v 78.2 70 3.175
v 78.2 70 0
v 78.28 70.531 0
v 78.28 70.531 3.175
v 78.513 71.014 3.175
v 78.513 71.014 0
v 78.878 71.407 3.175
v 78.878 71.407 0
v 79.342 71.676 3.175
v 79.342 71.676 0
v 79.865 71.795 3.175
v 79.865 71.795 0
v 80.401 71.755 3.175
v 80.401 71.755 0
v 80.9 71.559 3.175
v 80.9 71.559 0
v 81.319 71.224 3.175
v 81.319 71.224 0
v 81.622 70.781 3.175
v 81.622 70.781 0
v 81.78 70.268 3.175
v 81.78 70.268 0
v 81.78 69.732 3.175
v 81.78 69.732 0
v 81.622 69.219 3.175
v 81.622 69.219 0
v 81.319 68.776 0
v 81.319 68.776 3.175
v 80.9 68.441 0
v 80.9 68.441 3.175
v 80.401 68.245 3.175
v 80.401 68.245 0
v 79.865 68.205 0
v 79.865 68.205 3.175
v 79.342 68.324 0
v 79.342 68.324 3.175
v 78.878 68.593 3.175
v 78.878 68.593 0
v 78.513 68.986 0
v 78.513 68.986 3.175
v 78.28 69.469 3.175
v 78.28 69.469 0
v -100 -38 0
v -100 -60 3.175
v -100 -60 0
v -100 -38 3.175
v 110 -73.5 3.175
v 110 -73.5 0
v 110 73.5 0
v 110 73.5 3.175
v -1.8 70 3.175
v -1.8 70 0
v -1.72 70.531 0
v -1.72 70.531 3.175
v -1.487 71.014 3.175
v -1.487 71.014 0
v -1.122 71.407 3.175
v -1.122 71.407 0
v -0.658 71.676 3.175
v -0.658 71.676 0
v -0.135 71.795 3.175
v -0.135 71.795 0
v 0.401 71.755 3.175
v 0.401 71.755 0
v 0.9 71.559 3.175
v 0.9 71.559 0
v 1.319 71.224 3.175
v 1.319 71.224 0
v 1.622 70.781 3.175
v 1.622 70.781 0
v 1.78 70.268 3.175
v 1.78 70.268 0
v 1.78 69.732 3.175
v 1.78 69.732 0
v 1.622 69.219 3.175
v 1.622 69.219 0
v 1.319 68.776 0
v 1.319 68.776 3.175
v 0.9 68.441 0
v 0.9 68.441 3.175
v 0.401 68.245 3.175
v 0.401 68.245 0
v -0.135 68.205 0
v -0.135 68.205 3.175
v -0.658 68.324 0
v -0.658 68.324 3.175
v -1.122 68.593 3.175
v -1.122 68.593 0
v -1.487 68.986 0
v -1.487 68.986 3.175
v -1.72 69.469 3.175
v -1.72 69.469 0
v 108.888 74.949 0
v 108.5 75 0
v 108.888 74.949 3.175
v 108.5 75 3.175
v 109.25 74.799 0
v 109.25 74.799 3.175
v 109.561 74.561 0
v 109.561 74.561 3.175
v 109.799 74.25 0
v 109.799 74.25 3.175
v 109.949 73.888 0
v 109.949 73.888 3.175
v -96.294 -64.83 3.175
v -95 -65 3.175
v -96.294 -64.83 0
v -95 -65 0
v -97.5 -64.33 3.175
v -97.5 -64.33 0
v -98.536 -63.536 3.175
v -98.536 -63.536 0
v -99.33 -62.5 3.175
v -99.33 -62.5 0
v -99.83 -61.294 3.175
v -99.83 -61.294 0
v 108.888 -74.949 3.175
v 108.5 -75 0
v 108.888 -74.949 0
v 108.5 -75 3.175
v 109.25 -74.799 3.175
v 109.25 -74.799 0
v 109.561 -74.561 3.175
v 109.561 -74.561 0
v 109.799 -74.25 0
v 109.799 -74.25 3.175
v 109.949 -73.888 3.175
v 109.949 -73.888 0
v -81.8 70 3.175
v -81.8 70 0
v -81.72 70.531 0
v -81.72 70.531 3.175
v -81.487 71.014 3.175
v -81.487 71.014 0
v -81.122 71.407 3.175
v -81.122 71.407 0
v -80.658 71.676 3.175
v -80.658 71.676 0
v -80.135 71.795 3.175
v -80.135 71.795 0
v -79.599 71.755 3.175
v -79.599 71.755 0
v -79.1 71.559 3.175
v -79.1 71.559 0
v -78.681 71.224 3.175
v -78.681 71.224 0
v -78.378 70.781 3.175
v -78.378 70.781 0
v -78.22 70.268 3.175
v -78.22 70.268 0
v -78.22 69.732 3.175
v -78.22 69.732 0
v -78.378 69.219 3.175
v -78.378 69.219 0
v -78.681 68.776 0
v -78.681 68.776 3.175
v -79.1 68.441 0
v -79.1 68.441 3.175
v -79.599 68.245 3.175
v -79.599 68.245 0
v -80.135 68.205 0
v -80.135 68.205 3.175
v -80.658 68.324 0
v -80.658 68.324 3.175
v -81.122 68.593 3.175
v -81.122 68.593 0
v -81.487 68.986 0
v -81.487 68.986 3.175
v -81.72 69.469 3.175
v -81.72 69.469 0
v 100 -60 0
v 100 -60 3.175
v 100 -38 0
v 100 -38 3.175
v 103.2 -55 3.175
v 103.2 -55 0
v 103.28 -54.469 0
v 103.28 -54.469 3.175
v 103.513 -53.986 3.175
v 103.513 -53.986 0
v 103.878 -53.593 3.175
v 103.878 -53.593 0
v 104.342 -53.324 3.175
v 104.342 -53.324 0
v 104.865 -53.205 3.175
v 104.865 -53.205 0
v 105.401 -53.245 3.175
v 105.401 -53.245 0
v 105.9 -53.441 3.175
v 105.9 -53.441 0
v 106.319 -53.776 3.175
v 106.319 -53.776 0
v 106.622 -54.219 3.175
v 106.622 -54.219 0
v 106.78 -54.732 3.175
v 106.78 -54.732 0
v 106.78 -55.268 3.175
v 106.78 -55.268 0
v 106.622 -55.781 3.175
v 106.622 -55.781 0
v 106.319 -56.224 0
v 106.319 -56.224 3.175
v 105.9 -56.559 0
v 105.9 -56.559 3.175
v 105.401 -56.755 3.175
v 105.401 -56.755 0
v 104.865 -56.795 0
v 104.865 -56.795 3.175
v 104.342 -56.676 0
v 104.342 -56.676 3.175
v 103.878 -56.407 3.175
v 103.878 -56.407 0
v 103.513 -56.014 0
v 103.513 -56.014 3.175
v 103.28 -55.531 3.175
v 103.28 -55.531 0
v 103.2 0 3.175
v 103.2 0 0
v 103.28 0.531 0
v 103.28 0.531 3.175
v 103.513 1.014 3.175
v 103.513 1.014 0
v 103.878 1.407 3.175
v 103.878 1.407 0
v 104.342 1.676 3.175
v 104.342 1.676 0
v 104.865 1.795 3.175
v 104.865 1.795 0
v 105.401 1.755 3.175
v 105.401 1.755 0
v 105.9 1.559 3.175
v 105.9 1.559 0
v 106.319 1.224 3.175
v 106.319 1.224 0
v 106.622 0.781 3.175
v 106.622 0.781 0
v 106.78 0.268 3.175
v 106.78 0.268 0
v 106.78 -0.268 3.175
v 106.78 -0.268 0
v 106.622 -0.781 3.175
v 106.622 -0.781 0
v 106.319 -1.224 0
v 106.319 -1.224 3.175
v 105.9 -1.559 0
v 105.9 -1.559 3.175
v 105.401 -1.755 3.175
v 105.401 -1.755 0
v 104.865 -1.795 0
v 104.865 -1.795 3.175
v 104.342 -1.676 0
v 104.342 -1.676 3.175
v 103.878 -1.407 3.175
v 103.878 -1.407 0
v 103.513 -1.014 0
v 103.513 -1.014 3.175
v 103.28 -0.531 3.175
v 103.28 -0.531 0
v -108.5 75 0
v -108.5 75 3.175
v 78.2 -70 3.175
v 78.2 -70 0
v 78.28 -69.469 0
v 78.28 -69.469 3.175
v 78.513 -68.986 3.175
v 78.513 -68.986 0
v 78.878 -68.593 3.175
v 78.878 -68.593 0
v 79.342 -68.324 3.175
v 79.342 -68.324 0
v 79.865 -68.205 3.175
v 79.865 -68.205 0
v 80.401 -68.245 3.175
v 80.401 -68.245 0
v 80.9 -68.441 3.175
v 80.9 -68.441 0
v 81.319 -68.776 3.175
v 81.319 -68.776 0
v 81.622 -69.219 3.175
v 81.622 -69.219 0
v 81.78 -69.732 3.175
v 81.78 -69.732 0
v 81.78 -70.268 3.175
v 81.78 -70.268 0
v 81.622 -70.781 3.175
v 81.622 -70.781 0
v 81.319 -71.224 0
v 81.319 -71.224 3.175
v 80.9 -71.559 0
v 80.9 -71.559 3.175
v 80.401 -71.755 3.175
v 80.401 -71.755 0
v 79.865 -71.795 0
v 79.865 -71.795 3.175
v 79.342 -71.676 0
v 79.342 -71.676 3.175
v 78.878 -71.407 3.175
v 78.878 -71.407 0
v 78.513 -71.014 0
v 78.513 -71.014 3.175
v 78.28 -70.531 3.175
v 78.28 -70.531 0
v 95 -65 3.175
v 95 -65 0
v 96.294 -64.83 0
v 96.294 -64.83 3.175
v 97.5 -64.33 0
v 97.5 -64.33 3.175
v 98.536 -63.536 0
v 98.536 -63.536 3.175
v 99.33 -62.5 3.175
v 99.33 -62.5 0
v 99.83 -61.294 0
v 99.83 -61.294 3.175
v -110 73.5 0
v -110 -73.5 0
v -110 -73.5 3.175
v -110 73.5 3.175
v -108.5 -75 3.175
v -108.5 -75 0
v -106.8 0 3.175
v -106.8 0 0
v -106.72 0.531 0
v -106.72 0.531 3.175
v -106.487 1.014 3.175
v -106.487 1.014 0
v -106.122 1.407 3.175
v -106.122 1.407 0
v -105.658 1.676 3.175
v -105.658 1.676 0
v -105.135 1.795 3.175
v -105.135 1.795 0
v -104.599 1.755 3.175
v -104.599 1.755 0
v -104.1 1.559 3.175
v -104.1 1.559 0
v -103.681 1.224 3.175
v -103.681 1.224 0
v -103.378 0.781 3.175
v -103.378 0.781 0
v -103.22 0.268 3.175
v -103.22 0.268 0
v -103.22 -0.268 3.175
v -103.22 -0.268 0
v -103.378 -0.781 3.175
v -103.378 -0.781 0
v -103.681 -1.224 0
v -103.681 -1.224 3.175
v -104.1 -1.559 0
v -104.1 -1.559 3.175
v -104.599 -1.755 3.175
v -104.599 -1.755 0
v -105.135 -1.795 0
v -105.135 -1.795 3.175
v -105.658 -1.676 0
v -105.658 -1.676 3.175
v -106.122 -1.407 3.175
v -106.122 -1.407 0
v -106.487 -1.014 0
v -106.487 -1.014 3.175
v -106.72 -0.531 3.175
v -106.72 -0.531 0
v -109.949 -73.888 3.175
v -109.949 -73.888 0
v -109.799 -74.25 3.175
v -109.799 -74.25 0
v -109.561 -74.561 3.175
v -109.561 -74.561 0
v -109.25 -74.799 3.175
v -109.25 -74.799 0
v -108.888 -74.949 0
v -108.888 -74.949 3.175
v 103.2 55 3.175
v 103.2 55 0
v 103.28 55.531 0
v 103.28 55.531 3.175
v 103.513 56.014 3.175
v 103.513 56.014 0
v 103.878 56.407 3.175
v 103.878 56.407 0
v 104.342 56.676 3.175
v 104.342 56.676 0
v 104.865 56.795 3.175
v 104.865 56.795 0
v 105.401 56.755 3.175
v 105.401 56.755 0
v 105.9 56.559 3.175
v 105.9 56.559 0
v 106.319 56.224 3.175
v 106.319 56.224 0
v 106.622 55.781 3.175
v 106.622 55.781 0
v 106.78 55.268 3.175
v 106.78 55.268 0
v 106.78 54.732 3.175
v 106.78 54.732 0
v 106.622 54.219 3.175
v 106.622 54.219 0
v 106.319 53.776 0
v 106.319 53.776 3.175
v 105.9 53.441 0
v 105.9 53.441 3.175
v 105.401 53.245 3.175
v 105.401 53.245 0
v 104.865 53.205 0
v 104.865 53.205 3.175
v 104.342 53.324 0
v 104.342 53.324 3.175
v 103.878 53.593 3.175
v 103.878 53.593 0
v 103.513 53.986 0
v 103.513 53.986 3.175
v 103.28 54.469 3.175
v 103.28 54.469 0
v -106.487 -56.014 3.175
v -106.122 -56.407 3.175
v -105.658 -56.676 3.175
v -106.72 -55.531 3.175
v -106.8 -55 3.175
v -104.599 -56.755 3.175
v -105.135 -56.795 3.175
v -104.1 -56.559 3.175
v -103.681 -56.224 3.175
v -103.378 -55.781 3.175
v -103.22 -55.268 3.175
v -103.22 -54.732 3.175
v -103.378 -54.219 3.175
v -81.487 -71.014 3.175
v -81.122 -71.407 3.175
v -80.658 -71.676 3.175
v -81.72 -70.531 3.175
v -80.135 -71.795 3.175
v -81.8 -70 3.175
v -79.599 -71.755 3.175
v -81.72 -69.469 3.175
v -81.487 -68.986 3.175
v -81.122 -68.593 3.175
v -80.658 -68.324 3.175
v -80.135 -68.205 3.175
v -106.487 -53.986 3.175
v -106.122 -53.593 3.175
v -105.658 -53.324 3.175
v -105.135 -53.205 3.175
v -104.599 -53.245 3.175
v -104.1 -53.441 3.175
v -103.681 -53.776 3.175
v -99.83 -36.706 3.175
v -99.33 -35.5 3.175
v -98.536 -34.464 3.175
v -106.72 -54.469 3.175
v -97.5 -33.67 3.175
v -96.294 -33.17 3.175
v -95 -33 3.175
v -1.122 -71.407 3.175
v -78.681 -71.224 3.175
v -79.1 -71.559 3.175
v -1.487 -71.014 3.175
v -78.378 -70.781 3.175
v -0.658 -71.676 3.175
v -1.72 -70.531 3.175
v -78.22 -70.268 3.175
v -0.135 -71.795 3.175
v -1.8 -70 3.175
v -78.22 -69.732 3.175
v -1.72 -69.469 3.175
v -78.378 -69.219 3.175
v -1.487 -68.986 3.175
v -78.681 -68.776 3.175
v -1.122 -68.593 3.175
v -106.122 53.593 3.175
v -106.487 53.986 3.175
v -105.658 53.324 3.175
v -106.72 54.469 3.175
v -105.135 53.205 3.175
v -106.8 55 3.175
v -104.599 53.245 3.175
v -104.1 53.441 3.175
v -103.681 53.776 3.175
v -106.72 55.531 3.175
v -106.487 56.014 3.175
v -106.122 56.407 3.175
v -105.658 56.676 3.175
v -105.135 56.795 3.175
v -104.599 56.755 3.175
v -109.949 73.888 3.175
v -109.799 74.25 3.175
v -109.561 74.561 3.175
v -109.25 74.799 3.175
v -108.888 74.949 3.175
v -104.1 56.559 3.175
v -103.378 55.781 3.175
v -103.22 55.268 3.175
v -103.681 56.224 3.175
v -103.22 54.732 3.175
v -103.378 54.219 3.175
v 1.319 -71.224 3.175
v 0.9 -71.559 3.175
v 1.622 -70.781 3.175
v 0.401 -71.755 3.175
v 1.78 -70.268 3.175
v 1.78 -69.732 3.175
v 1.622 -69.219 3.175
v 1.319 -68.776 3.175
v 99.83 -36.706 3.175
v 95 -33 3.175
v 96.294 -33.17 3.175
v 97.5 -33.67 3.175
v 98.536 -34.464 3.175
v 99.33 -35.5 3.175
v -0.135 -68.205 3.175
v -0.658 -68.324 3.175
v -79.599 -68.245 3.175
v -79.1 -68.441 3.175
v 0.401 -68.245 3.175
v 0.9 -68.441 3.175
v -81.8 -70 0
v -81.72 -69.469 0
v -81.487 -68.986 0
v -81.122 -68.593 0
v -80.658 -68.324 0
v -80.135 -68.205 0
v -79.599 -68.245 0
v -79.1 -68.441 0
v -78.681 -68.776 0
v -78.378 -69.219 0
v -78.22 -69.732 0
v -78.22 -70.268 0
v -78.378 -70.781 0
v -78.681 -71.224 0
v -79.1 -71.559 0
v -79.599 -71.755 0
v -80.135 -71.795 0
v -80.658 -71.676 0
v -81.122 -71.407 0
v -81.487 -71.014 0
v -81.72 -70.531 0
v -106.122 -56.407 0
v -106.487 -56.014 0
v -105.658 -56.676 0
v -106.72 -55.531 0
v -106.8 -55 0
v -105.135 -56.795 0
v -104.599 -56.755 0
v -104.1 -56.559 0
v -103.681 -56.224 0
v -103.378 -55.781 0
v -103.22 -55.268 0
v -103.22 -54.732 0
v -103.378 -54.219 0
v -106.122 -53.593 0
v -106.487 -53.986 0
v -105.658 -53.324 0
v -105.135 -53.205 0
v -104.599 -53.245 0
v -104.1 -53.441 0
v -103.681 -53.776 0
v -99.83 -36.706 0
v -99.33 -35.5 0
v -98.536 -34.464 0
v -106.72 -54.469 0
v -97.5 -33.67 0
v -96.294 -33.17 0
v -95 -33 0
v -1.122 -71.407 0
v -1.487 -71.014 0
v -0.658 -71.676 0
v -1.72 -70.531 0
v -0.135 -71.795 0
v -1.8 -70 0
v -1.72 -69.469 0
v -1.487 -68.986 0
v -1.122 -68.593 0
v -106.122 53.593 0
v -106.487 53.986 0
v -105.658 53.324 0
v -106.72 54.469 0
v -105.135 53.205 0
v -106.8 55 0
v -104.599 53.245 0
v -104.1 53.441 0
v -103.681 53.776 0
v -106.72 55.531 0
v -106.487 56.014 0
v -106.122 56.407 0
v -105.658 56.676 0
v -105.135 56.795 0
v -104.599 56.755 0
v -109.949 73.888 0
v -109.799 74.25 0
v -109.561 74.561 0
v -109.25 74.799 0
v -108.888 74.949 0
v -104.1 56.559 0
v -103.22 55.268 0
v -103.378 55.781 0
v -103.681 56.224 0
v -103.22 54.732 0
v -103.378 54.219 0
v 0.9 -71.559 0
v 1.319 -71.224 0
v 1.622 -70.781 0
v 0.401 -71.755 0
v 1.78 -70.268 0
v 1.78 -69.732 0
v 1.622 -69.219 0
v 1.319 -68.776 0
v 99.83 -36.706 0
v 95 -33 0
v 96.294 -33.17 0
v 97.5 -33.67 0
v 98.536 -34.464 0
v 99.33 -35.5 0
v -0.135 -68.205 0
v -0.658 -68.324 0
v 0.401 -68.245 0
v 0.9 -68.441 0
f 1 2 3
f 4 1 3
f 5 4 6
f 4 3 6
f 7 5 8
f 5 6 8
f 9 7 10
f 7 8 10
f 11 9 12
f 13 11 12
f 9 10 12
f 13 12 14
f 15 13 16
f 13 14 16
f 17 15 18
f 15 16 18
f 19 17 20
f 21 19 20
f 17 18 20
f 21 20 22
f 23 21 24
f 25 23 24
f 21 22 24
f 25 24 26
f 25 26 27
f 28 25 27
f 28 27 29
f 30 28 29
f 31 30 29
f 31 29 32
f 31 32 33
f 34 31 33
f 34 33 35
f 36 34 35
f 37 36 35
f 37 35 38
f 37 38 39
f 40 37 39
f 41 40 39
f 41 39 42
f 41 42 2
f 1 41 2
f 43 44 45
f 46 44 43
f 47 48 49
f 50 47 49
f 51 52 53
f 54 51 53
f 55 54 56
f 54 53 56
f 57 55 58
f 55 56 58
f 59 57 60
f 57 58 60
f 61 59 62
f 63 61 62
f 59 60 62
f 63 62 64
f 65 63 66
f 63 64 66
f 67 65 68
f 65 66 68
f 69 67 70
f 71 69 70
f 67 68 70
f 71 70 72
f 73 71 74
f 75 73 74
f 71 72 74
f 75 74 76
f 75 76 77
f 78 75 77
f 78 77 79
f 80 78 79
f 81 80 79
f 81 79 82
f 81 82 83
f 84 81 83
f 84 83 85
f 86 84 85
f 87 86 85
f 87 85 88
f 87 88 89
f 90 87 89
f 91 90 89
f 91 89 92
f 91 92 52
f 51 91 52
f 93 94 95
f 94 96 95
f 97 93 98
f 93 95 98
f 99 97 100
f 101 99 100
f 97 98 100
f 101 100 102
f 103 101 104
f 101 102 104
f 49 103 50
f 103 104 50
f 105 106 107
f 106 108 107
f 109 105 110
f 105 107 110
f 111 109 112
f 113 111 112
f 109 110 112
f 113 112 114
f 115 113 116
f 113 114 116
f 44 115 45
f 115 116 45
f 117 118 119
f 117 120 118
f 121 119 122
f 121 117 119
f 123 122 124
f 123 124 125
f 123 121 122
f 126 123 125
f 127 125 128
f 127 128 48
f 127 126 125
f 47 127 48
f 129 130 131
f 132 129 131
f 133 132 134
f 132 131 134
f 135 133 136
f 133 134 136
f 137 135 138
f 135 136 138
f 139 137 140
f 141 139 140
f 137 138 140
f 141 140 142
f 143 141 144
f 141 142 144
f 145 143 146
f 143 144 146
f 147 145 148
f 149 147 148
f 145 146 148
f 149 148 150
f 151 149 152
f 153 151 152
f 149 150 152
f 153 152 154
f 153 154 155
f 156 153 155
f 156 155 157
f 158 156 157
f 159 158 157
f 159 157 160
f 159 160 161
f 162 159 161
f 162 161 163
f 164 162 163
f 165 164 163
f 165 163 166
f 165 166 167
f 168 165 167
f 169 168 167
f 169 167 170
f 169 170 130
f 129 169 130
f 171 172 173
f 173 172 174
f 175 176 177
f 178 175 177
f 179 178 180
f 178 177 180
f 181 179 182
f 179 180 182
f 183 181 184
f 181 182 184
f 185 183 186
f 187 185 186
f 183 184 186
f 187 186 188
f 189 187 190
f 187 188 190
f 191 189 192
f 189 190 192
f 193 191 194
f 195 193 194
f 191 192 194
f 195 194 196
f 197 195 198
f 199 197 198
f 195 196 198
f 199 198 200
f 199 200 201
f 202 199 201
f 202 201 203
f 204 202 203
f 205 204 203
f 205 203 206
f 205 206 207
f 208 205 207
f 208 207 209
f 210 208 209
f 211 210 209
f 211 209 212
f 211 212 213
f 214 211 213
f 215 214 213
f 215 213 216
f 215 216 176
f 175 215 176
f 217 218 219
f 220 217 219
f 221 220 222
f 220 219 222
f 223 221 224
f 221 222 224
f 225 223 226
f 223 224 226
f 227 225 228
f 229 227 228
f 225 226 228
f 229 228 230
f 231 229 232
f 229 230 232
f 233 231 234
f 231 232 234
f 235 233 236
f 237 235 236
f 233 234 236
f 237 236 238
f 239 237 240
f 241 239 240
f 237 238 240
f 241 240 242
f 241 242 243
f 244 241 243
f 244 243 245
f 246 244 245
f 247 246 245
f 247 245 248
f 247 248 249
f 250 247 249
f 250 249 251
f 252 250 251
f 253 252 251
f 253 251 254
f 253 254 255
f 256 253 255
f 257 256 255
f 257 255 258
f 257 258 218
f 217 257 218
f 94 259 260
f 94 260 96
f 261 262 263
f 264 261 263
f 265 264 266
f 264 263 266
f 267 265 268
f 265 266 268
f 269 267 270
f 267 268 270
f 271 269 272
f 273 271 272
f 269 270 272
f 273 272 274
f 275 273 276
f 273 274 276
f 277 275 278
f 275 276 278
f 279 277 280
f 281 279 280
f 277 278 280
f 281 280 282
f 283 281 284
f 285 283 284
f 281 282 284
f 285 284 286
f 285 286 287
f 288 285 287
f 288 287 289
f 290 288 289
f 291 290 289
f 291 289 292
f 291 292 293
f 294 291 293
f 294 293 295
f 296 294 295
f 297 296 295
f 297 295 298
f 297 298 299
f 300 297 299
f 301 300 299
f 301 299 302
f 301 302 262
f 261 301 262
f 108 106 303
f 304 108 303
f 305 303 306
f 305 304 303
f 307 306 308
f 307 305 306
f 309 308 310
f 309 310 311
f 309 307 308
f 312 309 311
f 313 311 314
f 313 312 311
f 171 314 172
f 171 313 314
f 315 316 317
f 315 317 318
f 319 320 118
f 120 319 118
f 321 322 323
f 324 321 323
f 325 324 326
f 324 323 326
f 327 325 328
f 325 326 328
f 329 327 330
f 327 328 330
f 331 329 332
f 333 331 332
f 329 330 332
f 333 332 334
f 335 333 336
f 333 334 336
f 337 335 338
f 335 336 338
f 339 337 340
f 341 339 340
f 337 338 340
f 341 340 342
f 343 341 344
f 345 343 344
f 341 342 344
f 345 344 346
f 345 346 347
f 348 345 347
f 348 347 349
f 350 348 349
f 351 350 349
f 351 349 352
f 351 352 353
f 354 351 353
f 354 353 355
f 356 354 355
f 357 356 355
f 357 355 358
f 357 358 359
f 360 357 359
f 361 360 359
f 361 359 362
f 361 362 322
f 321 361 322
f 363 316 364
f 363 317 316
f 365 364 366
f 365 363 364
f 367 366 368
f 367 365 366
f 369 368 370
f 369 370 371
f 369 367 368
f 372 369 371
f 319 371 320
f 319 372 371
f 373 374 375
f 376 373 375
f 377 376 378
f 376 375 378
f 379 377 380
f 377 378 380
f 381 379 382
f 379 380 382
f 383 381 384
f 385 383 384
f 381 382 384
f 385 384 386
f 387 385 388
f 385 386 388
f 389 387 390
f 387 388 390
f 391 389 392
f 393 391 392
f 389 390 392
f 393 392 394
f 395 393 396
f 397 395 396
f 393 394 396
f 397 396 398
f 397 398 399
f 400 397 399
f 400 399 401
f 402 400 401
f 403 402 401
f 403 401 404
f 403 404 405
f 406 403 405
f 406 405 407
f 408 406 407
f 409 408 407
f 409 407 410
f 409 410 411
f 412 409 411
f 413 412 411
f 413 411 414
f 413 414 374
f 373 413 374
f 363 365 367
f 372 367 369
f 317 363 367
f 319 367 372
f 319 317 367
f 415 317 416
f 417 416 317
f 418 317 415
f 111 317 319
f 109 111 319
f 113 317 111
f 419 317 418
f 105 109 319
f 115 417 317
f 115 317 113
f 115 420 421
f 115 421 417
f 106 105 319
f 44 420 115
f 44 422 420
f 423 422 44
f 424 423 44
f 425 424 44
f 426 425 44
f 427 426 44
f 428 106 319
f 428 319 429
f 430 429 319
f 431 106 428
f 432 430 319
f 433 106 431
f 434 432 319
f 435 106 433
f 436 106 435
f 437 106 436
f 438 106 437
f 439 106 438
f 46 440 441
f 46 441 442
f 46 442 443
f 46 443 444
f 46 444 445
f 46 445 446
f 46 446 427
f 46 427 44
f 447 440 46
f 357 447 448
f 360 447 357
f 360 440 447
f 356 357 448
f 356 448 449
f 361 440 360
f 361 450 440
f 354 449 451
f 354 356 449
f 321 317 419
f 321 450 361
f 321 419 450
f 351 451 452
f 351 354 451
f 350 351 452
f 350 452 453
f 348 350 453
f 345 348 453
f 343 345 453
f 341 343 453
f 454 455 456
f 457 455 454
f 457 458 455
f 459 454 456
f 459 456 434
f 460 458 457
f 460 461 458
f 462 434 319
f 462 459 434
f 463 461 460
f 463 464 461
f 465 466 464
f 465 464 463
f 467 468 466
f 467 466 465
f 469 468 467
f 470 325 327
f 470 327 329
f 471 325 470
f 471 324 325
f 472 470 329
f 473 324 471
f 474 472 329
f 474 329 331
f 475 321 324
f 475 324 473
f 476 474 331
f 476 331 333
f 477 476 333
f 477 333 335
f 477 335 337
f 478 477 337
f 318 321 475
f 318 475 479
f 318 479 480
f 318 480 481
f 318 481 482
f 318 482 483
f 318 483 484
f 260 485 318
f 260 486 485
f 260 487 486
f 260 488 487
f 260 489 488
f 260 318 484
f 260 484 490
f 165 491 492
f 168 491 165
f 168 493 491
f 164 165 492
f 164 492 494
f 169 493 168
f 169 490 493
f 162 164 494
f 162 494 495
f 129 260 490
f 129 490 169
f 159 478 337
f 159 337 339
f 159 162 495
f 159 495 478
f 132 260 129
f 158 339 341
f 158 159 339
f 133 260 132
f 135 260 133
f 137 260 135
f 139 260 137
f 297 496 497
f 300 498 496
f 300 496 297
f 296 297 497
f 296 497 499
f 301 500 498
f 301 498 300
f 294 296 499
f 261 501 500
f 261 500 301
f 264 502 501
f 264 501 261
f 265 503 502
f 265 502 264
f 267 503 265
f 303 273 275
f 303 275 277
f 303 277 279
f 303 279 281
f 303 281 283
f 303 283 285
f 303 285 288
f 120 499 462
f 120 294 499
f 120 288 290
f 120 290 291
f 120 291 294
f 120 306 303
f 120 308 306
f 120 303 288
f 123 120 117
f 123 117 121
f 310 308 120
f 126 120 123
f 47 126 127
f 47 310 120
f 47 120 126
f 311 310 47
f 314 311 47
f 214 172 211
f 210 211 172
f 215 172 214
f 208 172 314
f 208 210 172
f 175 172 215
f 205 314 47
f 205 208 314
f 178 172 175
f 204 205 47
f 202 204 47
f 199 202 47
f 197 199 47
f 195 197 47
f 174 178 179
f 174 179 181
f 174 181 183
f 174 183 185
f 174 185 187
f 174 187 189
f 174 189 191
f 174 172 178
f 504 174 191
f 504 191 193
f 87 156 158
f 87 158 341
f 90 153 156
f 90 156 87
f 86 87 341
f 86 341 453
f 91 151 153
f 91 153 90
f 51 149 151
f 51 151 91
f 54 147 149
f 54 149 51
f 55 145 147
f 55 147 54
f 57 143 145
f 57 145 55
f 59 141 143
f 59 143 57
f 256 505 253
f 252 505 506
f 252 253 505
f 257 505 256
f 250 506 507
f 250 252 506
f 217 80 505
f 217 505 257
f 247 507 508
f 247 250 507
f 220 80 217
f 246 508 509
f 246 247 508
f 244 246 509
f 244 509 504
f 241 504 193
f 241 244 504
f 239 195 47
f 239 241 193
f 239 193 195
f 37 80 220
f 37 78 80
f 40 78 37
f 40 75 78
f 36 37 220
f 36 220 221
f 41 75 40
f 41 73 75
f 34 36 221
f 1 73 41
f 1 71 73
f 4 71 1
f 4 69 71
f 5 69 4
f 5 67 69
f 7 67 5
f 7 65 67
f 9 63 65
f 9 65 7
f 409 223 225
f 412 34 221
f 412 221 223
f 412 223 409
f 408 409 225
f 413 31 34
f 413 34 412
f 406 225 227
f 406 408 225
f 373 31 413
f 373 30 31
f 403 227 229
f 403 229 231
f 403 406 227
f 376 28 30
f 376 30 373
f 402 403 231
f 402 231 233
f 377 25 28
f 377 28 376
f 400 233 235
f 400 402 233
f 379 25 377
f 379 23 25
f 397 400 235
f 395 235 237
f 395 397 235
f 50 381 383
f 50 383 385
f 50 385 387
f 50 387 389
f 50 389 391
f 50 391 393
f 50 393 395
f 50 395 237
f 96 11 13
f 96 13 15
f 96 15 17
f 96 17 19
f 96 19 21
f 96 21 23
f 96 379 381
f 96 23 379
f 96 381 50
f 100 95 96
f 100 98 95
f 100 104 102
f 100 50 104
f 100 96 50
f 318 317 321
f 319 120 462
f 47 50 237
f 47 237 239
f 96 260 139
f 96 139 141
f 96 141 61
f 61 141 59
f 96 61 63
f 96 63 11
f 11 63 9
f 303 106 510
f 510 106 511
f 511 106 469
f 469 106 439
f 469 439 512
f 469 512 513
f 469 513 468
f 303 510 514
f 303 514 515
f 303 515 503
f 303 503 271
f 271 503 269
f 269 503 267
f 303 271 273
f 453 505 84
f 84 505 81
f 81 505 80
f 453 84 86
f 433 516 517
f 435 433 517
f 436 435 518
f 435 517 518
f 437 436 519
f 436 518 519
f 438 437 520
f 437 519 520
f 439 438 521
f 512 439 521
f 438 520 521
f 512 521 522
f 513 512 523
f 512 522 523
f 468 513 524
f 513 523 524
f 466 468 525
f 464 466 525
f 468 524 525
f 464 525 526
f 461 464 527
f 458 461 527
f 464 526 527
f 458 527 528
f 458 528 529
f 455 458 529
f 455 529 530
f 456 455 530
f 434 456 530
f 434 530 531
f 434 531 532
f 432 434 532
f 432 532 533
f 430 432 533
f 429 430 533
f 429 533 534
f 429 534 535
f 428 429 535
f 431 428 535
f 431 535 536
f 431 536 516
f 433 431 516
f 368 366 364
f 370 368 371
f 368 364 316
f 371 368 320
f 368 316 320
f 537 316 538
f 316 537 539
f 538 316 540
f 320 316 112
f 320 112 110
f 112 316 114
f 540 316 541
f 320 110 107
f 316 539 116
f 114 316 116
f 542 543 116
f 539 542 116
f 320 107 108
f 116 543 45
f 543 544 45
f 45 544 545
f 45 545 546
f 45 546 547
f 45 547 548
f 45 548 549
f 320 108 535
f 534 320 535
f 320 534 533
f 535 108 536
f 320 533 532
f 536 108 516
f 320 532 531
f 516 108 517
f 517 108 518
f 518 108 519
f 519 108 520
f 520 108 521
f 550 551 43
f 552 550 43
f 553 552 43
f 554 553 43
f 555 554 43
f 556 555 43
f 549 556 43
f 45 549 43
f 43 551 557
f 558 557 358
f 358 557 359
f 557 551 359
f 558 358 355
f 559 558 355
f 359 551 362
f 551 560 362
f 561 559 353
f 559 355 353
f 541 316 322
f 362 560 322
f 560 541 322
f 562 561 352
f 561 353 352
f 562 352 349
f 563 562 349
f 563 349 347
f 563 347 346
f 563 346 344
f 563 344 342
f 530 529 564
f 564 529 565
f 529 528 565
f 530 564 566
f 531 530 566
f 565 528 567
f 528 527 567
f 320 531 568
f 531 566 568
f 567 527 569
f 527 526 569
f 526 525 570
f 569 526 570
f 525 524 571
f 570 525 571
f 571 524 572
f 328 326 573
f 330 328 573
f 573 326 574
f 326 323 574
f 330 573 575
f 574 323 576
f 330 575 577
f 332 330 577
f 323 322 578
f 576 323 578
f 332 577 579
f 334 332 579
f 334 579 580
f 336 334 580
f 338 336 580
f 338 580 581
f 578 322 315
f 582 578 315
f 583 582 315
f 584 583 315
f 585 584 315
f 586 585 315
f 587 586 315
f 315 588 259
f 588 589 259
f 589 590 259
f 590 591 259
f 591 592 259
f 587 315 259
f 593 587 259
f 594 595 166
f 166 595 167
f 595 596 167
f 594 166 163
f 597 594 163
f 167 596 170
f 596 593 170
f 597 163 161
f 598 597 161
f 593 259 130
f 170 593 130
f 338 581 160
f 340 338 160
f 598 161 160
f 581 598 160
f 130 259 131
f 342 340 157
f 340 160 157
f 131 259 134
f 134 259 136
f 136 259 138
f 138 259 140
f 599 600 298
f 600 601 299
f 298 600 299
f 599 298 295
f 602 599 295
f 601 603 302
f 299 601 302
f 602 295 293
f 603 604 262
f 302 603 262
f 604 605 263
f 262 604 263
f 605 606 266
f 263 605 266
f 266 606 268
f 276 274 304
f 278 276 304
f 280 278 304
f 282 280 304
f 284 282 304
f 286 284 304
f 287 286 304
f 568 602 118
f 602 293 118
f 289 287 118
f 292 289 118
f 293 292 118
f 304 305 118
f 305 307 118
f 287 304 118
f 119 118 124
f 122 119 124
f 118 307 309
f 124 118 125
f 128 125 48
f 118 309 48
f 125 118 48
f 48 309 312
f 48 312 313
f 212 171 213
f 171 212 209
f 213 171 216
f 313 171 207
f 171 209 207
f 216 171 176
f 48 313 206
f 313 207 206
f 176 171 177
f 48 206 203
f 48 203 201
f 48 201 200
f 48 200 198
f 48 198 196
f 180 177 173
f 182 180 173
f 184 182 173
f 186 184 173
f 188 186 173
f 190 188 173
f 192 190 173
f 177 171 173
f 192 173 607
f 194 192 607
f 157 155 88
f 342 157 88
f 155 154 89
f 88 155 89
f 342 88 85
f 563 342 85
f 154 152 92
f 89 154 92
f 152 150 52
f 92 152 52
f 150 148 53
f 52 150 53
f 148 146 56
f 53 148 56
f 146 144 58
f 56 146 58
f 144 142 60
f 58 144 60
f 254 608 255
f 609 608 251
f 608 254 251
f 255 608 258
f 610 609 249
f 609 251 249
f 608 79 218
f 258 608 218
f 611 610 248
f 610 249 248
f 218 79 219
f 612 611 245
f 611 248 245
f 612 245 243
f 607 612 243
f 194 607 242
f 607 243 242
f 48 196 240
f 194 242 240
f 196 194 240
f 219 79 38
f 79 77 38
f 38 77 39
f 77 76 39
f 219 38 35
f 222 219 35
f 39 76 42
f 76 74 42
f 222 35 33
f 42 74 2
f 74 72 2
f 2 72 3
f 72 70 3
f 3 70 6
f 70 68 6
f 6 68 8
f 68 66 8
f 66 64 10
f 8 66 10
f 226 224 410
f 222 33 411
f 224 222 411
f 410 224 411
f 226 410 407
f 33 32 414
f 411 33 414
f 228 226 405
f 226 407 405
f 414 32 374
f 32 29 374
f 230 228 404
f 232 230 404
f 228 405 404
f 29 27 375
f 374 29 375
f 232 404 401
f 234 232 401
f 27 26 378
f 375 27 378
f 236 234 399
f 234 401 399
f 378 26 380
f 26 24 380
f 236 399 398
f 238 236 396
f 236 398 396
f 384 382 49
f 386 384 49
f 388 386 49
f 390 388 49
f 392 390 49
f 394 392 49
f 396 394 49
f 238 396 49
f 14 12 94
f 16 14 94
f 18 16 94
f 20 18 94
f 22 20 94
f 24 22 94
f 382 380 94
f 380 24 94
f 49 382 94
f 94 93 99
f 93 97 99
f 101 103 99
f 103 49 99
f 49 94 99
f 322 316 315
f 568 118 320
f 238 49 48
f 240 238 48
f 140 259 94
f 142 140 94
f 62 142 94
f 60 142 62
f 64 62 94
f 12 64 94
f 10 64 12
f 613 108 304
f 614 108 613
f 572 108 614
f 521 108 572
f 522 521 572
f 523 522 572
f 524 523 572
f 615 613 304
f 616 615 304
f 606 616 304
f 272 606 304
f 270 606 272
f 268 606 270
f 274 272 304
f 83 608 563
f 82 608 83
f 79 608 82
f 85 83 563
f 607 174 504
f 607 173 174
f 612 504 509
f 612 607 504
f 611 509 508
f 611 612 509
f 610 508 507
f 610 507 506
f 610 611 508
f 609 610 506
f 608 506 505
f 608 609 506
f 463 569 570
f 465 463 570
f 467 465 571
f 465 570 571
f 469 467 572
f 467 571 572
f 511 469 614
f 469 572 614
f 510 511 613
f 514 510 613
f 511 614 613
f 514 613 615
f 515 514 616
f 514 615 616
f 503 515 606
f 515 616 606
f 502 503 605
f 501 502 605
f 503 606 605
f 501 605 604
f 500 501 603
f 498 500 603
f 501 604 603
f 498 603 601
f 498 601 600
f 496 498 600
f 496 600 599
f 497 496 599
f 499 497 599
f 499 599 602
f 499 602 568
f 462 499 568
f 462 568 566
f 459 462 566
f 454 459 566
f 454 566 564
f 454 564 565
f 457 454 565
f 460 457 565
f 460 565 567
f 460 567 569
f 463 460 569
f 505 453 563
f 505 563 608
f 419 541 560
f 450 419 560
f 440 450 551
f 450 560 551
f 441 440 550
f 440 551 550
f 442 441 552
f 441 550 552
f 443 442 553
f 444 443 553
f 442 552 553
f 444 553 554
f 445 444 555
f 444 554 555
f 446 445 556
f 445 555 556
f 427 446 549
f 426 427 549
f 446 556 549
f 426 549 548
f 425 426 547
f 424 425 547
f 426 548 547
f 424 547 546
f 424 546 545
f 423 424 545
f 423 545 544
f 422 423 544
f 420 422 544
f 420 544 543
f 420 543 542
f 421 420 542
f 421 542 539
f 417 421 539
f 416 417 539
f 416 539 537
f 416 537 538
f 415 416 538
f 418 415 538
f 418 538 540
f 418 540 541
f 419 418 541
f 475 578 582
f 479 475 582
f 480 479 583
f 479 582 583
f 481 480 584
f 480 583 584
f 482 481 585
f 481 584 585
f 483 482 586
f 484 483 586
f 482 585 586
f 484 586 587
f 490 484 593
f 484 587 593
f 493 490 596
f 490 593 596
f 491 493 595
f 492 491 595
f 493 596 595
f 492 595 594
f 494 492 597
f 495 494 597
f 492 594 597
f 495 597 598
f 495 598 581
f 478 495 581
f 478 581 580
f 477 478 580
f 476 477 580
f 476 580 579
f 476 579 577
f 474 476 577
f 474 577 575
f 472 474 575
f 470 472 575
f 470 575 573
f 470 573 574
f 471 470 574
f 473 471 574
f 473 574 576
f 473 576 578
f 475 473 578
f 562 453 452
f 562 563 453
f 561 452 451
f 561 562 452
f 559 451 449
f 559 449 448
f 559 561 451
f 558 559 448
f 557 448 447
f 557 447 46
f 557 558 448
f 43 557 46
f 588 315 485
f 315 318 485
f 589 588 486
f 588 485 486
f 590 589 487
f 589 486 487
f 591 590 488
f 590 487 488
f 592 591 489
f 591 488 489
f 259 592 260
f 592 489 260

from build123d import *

# Parameters (mm, degrees)
SKETCH1_W            = 220
SKETCH1_H            = 150
BOSS_EXTRUDE1_DEPTH  = 3.175
M3_CLEARANCE_HOLE1_D = 3.6
SKETCH4_W            = 10
SKETCH4_H            = 10
BOSS_EXTRUDE2_DEPTH  = 3.175
FILLET2_R            = 1.5
SKETCH5_W            = 200
SKETCH5_H            = 32
CUT_EXTRUDE1_DEPTH   = 4.175
FILLET3_R            = 5


with BuildPart() as part:
    # Sketch1 → Boss-Extrude1 (new body)
    with BuildSketch(Plane.XY):
        Rectangle(SKETCH1_W, SKETCH1_H)
    extrude(amount=BOSS_EXTRUDE1_DEPTH)

    # M3 Clearance Hole1 (through all)
    with Locations(Plane.XY.offset(3.175)):
        with Locations((0, 0), (-80, 70), (80, 70), (0, 70), (-105, 55), (-105, 0), (-105, -55), (-80, -70), (0, -70), (80, -70), (105, -55), (105, 0), (105, 55)):
            Hole(M3_CLEARANCE_HOLE1_D / 2)

    # Sketch4 → Boss-Extrude2 (add, through all)
    with BuildSketch(Plane.XY.offset(3.175)):
        Rectangle(SKETCH4_W, SKETCH4_H)
    extrude(amount=-BOSS_EXTRUDE2_DEPTH)

    # Fillet2
    fillet2_edges = [part.edges().sort_by_distance(p)[0] for p in [
        (-110, -75, 1.5875),
        (-110, 75, 1.5875),
        (110, 75, 1.5875),
        (110, -75, 1.5875),
    ]]
    fillet(fillet2_edges, radius=FILLET2_R)

    # Sketch5 → Cut-Extrude1 (cut, through all)
    with BuildSketch(Plane.XY.offset(3.175)):
        with Locations((0, -49)):
            Rectangle(SKETCH5_W, SKETCH5_H)
    extrude(amount=-CUT_EXTRUDE1_DEPTH, mode=Mode.SUBTRACT)

    # Fillet3
    fillet3_edges = [part.edges().sort_by_distance(p)[0] for p in [
        (100, -33, 1.5875),
        (100, -65, 1.5875),
        (-100, -65, 1.5875),
        (-100, -33, 1.5875),
    ]]
    fillet(fillet3_edges, radius=FILLET3_R)


solid = part.part
